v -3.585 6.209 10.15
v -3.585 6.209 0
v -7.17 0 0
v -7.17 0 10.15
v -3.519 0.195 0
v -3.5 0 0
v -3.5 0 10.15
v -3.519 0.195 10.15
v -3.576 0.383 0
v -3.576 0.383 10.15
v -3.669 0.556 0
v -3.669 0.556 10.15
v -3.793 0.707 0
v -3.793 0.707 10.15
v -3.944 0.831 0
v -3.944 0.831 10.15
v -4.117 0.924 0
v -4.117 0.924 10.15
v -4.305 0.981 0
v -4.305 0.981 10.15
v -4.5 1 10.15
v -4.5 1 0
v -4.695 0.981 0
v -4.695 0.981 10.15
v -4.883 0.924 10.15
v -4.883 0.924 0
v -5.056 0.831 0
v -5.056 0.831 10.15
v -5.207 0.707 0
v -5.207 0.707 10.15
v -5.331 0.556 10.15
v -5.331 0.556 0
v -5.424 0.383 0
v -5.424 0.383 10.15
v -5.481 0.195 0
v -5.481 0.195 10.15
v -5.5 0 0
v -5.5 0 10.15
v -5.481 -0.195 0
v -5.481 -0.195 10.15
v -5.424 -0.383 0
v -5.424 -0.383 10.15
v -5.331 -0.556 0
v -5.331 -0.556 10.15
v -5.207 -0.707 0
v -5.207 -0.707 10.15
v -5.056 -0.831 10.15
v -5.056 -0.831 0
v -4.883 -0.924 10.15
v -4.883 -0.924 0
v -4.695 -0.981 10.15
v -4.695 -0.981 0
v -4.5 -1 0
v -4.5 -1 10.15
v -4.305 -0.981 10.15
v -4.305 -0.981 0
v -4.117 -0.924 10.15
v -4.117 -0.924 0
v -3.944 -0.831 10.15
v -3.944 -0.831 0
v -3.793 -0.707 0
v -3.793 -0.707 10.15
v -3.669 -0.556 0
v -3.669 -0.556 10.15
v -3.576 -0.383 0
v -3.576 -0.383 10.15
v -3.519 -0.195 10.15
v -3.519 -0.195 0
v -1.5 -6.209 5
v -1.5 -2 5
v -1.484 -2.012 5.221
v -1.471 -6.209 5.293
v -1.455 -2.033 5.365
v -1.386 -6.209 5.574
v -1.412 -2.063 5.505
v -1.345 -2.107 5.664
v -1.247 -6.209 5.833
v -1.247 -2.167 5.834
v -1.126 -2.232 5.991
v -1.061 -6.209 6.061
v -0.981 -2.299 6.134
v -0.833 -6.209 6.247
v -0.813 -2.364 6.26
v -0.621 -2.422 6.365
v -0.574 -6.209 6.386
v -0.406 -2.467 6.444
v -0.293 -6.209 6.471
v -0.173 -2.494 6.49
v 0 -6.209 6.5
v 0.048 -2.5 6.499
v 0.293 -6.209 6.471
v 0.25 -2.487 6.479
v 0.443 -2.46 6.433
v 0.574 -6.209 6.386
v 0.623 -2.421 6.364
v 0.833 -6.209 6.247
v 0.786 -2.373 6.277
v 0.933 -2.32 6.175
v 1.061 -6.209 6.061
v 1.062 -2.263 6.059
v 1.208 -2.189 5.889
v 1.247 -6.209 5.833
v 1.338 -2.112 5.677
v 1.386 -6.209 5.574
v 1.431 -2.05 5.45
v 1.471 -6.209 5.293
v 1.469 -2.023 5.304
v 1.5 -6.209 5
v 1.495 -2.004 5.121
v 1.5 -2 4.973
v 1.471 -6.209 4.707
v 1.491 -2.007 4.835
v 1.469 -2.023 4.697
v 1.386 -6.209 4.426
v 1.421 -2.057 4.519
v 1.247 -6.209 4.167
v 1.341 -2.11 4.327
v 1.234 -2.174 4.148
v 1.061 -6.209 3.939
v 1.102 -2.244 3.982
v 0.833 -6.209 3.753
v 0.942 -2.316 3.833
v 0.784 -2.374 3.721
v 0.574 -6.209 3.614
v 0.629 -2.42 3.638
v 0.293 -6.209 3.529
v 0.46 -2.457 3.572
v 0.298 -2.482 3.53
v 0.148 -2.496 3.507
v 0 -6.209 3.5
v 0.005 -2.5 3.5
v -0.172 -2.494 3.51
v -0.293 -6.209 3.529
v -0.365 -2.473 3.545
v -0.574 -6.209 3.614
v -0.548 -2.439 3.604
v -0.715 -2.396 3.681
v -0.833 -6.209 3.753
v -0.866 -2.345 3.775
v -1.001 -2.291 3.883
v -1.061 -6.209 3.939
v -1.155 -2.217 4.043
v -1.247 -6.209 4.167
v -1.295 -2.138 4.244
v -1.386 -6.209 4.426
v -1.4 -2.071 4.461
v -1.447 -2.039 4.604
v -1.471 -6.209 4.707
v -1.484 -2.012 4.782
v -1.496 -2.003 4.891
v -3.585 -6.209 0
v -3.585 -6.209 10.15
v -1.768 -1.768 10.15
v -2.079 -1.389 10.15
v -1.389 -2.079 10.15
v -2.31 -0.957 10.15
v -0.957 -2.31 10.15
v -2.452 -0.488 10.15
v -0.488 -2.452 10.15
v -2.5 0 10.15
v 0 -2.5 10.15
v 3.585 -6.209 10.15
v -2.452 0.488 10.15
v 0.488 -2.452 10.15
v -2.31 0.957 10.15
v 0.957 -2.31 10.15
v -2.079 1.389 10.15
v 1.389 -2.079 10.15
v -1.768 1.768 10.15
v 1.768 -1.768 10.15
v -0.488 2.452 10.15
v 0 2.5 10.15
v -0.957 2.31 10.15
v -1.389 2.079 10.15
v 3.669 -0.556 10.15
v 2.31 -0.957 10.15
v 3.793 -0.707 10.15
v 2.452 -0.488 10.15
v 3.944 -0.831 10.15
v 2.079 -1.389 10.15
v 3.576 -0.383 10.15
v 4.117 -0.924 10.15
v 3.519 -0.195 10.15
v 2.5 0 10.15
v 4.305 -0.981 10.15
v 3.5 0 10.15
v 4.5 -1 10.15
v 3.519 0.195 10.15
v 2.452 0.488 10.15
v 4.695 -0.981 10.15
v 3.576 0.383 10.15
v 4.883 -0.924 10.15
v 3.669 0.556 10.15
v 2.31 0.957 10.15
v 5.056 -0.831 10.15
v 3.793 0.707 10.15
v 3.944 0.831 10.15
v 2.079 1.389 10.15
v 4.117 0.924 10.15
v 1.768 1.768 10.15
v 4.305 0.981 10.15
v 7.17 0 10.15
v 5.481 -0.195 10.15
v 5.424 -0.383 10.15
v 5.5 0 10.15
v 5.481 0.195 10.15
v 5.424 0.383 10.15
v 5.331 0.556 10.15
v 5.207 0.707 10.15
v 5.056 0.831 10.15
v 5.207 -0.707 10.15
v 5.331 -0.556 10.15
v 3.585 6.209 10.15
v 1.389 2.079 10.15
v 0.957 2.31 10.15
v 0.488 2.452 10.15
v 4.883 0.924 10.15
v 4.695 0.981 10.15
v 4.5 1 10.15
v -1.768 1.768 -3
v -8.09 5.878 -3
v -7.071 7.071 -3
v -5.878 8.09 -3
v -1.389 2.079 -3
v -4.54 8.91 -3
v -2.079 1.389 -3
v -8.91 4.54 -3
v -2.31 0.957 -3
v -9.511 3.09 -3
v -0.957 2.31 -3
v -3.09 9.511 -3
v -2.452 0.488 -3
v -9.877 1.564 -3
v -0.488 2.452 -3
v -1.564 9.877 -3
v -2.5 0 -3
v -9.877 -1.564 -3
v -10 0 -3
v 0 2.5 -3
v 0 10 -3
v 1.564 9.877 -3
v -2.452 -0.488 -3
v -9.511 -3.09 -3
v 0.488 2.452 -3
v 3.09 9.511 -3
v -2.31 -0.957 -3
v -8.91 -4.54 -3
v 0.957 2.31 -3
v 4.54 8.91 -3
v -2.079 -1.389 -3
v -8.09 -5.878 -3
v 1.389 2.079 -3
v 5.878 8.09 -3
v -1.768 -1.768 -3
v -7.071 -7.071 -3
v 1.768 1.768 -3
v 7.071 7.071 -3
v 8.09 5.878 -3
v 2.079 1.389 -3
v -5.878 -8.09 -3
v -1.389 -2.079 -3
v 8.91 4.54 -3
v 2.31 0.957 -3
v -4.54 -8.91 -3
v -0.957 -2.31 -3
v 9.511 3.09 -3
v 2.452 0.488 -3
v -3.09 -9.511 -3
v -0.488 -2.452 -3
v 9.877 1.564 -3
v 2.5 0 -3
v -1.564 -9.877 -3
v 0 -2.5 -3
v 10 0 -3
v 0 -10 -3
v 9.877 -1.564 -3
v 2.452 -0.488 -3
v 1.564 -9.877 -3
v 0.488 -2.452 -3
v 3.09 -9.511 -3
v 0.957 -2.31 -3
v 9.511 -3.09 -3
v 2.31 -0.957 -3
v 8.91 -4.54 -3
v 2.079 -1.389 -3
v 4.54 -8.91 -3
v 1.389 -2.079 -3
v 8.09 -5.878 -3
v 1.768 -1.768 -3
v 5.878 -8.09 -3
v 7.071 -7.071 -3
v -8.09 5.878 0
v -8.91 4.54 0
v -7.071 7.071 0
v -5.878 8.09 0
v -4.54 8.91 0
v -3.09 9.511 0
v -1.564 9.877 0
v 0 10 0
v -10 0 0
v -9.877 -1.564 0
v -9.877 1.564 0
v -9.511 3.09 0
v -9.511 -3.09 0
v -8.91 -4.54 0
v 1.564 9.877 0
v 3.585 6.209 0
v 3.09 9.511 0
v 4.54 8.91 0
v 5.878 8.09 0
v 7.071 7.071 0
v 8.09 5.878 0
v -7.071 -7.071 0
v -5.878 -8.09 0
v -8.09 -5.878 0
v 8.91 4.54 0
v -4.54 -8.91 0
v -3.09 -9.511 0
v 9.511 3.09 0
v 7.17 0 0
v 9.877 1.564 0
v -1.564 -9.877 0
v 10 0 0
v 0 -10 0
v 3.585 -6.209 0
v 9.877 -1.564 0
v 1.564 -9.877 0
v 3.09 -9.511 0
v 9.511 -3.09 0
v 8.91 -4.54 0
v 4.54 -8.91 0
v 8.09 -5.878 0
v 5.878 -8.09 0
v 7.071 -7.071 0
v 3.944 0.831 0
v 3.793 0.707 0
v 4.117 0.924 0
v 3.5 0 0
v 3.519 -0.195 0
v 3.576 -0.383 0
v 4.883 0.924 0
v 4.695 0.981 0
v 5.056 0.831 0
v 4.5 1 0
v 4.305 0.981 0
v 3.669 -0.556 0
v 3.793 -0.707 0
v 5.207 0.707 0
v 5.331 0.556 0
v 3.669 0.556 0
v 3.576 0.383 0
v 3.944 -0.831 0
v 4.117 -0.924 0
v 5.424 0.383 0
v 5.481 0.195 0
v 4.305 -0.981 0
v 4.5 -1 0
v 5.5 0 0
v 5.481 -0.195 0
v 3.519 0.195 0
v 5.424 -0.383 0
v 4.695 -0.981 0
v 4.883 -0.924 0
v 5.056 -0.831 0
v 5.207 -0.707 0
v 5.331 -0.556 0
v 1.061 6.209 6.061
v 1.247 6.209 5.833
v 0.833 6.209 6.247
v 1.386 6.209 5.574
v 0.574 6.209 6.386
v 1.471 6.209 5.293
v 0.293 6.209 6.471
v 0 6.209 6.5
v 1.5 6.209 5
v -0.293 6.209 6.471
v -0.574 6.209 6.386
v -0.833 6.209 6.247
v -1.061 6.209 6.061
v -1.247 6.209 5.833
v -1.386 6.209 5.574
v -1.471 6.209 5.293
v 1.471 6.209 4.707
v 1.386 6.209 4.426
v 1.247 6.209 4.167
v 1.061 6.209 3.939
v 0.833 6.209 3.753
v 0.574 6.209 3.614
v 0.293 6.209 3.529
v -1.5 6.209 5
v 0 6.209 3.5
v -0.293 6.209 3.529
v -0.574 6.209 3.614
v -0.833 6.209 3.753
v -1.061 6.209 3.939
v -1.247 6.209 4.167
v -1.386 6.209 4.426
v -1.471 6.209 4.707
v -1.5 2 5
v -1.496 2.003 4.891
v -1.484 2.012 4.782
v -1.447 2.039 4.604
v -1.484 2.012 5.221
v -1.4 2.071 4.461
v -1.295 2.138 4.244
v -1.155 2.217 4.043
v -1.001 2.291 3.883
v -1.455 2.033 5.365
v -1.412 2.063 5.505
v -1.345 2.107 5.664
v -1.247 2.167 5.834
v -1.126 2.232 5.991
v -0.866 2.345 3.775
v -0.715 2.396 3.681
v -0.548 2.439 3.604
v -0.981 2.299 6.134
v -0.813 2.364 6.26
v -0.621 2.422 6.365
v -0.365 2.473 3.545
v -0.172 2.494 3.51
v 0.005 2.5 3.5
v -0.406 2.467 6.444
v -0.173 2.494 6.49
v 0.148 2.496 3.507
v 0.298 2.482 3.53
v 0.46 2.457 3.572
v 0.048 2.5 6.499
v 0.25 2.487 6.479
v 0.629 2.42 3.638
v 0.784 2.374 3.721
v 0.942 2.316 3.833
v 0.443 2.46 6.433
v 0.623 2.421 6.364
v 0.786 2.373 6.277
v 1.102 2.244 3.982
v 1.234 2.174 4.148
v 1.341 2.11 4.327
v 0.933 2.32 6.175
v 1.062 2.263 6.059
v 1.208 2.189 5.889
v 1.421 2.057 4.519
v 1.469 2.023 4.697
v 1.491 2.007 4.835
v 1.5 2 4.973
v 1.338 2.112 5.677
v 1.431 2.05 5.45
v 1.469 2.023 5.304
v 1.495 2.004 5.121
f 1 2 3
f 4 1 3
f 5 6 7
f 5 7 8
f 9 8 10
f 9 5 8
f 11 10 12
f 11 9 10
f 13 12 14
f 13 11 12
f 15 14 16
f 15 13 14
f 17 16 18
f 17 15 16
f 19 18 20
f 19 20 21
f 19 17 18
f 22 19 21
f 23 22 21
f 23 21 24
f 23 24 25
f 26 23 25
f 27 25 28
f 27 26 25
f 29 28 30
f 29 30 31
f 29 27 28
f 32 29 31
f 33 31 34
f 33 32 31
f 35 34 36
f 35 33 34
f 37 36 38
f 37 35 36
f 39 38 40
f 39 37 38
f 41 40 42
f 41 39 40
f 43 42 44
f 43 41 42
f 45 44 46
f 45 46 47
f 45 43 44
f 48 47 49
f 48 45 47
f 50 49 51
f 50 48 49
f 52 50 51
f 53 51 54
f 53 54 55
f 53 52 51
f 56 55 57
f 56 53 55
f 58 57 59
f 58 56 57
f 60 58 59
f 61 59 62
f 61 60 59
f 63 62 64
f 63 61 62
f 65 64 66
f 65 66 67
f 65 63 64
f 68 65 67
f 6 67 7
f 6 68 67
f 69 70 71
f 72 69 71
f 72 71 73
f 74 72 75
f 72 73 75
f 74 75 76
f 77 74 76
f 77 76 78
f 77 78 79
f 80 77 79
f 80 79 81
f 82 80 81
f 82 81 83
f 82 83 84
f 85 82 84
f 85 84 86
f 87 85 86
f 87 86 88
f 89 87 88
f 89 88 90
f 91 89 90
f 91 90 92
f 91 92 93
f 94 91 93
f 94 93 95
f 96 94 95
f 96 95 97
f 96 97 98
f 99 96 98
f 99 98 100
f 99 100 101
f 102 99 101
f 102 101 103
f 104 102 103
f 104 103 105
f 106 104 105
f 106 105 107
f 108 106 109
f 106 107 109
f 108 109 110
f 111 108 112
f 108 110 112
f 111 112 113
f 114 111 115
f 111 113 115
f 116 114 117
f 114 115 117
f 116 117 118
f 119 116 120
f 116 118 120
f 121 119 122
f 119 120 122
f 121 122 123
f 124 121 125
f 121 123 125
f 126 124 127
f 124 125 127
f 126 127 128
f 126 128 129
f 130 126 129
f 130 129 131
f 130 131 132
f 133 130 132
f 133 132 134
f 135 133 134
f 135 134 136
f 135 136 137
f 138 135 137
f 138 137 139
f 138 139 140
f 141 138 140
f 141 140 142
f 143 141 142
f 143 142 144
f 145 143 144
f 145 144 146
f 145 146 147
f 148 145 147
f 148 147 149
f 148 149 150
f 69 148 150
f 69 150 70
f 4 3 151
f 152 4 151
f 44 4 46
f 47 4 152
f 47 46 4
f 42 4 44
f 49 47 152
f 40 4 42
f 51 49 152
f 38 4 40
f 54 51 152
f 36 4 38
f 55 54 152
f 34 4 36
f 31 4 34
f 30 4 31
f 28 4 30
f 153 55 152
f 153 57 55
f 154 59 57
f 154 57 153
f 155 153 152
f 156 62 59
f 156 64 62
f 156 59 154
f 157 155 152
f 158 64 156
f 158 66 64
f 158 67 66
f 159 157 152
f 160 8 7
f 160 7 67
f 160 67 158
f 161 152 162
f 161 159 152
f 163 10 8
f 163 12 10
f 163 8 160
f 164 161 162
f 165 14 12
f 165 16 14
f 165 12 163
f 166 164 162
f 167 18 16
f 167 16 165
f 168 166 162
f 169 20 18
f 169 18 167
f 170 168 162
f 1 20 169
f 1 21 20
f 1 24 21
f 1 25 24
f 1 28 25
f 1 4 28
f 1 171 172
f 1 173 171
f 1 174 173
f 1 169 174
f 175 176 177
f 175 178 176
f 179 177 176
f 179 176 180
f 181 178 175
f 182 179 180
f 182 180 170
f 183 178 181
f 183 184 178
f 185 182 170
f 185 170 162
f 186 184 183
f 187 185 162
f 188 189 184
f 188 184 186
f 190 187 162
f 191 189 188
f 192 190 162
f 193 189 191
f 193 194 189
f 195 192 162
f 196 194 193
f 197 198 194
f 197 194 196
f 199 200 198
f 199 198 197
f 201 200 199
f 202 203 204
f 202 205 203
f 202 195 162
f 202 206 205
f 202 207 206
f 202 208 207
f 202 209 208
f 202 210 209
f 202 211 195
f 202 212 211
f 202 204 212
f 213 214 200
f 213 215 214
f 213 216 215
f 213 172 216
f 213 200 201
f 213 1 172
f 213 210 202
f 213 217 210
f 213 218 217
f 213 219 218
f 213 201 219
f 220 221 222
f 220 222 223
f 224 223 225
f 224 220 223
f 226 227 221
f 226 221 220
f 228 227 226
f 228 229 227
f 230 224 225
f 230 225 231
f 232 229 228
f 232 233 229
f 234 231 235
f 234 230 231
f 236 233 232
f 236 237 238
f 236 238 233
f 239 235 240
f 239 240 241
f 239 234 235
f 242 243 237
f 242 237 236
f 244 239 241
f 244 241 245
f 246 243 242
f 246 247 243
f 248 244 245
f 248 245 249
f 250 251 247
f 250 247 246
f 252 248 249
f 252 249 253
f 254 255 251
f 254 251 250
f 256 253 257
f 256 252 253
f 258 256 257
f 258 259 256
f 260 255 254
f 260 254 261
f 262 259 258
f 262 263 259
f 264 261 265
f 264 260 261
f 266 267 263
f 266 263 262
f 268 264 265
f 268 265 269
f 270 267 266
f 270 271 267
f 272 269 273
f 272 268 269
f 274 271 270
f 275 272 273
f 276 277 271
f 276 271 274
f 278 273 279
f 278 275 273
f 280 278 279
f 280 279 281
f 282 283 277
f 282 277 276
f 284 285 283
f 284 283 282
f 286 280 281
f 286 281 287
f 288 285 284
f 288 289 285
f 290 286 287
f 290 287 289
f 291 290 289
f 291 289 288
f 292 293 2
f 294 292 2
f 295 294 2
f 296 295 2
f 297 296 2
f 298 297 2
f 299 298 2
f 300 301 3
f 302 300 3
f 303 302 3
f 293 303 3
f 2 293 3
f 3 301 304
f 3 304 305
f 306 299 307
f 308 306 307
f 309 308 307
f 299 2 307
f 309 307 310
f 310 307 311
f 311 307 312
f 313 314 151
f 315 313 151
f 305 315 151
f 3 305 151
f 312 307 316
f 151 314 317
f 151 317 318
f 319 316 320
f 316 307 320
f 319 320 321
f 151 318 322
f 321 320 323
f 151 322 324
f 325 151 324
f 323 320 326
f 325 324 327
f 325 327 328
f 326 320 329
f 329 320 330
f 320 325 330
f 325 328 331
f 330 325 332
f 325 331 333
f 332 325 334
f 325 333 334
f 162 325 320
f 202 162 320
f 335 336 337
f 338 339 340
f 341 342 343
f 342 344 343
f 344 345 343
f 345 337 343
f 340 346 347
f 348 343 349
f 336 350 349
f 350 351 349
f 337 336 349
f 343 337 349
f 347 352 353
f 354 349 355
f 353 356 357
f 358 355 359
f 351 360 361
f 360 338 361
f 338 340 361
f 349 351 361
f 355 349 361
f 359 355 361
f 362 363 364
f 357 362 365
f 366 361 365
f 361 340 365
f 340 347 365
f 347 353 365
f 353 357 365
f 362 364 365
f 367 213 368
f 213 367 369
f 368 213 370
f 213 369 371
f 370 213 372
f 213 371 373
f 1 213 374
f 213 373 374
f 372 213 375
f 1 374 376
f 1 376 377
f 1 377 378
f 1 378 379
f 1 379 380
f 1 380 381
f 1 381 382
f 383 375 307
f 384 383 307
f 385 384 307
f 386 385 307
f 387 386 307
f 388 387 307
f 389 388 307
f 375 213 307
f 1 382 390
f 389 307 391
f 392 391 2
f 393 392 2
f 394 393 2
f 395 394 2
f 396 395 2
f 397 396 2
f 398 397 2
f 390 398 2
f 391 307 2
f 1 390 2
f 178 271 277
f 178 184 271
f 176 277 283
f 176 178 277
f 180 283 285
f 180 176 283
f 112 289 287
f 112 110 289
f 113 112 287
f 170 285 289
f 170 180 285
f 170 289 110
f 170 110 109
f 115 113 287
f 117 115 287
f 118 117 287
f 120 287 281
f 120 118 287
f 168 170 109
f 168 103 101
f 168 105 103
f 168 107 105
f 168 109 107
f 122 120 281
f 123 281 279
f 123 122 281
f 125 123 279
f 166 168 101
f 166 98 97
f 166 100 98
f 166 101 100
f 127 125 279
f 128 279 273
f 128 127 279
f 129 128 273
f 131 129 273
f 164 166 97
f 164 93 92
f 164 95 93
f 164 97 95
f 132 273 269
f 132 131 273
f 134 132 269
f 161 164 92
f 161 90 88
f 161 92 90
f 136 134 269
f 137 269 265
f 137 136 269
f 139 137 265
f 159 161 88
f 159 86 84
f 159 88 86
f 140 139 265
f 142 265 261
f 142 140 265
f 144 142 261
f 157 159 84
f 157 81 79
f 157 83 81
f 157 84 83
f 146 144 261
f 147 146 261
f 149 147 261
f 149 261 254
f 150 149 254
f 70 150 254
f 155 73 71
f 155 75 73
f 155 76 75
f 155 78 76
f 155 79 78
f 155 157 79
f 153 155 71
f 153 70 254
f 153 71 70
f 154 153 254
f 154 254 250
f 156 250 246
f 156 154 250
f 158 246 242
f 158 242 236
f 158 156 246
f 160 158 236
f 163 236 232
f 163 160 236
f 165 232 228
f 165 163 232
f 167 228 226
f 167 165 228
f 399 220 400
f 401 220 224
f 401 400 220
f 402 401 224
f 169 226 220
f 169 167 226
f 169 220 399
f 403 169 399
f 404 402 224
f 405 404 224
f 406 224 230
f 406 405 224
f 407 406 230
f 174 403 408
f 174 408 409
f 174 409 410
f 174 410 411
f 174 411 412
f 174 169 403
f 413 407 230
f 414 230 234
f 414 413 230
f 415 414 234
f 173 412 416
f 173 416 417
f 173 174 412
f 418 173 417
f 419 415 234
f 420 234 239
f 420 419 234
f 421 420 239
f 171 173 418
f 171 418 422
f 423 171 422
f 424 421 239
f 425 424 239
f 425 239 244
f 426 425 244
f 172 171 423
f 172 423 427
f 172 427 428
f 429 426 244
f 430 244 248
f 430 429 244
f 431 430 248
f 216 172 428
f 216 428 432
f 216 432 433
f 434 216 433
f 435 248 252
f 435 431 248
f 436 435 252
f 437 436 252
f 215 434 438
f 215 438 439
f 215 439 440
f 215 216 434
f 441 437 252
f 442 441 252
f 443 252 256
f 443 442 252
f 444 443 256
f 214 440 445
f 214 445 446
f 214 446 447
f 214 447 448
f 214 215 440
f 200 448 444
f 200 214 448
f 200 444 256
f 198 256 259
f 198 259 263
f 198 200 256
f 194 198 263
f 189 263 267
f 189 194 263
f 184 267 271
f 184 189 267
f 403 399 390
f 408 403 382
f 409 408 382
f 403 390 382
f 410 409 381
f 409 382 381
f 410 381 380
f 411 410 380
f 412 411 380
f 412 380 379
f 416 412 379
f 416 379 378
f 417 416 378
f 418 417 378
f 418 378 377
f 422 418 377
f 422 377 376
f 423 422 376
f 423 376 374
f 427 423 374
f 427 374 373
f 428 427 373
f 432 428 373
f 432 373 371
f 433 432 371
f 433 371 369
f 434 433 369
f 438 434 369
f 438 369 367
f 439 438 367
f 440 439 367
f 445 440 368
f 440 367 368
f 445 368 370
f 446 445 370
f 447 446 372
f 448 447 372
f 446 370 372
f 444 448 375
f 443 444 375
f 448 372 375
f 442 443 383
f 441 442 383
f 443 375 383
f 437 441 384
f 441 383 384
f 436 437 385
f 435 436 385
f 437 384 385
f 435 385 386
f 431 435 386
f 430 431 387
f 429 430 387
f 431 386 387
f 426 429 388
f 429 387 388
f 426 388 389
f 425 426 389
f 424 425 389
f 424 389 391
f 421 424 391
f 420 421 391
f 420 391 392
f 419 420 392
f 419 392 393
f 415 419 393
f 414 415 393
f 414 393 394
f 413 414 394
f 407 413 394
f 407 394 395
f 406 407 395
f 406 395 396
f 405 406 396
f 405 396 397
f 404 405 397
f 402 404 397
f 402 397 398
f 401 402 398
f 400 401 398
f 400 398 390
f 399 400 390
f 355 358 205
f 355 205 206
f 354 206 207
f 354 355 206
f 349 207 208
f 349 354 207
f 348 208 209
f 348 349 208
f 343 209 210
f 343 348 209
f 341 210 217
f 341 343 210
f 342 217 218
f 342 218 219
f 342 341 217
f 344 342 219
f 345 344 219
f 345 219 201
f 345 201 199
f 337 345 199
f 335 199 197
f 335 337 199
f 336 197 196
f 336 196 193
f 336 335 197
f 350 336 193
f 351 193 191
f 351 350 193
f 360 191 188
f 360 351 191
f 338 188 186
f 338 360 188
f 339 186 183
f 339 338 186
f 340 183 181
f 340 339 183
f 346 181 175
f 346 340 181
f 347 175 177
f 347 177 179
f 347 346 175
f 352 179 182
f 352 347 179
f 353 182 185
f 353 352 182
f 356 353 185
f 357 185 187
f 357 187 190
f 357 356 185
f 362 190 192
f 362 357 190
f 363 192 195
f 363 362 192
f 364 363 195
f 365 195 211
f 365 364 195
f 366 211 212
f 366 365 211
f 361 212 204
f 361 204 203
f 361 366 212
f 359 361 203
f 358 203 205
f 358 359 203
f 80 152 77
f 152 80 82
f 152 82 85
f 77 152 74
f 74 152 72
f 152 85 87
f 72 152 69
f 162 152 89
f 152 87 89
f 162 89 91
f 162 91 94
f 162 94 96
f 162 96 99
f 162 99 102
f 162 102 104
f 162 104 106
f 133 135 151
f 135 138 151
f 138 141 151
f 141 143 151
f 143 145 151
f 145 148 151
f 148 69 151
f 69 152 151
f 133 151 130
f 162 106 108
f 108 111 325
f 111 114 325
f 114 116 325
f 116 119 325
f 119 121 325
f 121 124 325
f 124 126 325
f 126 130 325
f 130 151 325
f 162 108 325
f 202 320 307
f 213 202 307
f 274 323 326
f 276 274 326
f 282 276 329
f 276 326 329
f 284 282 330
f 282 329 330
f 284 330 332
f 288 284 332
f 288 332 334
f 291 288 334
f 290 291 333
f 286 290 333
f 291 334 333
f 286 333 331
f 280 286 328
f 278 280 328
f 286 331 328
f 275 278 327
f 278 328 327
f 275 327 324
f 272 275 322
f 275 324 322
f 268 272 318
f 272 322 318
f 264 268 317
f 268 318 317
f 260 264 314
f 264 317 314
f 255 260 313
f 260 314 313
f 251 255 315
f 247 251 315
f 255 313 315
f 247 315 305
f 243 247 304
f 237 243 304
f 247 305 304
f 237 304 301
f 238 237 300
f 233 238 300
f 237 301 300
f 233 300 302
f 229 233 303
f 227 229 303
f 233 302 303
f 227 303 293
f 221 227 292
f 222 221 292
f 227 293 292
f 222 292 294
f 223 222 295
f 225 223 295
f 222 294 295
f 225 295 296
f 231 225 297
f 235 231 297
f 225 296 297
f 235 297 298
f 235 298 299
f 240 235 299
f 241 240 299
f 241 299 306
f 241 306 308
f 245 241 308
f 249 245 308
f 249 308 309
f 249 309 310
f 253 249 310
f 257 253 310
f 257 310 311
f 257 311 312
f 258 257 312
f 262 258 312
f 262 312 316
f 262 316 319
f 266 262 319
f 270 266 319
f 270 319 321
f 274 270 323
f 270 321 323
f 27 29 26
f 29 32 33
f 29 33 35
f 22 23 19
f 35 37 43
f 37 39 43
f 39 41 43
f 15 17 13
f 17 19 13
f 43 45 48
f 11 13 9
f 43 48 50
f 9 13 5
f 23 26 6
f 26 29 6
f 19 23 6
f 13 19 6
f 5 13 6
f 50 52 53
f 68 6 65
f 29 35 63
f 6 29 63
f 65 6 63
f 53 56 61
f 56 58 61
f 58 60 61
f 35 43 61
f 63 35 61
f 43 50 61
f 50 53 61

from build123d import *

# Parameters (mm, degrees)
SKETCH_R      = 2.5
SKETCH_R_2    = 1
PAD_DEPTH     = 10.15
SKETCH001_R   = 1.5
POCKET_DEPTH  = 12.419804
SKETCH002_R   = 10
SKETCH002_R_2 = 2.5
PAD001_DEPTH  = 3


with BuildPart() as part:
    # Sketch → Pad (new body)
    with BuildSketch(Plane.XY):
        Polygon((-7.17, 0), (-3.585, -6.209402), (3.585, -6.209402), (7.17, 0), (3.585, 6.209402), (-3.585, 6.209402), align=None)
        Circle(SKETCH_R, mode=Mode.SUBTRACT)
        with Locations((4.5, 0)):
            Circle(SKETCH_R_2, mode=Mode.SUBTRACT)
        with Locations((-4.5, 0)):
            Circle(SKETCH_R_2, mode=Mode.SUBTRACT)
    extrude(amount=PAD_DEPTH)

    # Sketch001 → Pocket (cut, through all)
    with BuildSketch(Plane(origin=(0, 6.209402, 0), x_dir=(-1, 0, 0), z_dir=(0, 1, 0))):
        with Locations((0, 5)):
            Circle(SKETCH001_R)
    extrude(amount=-POCKET_DEPTH, mode=Mode.SUBTRACT)

    # Sketch002 → Pad001 (new body)
    with BuildSketch(Plane(origin=(0, 0, 0), x_dir=(1, 0, 0), z_dir=(0, 0, -1))):
        Circle(SKETCH002_R)
        Circle(SKETCH002_R_2, mode=Mode.SUBTRACT)
    extrude(amount=PAD001_DEPTH)


solid = part.part
